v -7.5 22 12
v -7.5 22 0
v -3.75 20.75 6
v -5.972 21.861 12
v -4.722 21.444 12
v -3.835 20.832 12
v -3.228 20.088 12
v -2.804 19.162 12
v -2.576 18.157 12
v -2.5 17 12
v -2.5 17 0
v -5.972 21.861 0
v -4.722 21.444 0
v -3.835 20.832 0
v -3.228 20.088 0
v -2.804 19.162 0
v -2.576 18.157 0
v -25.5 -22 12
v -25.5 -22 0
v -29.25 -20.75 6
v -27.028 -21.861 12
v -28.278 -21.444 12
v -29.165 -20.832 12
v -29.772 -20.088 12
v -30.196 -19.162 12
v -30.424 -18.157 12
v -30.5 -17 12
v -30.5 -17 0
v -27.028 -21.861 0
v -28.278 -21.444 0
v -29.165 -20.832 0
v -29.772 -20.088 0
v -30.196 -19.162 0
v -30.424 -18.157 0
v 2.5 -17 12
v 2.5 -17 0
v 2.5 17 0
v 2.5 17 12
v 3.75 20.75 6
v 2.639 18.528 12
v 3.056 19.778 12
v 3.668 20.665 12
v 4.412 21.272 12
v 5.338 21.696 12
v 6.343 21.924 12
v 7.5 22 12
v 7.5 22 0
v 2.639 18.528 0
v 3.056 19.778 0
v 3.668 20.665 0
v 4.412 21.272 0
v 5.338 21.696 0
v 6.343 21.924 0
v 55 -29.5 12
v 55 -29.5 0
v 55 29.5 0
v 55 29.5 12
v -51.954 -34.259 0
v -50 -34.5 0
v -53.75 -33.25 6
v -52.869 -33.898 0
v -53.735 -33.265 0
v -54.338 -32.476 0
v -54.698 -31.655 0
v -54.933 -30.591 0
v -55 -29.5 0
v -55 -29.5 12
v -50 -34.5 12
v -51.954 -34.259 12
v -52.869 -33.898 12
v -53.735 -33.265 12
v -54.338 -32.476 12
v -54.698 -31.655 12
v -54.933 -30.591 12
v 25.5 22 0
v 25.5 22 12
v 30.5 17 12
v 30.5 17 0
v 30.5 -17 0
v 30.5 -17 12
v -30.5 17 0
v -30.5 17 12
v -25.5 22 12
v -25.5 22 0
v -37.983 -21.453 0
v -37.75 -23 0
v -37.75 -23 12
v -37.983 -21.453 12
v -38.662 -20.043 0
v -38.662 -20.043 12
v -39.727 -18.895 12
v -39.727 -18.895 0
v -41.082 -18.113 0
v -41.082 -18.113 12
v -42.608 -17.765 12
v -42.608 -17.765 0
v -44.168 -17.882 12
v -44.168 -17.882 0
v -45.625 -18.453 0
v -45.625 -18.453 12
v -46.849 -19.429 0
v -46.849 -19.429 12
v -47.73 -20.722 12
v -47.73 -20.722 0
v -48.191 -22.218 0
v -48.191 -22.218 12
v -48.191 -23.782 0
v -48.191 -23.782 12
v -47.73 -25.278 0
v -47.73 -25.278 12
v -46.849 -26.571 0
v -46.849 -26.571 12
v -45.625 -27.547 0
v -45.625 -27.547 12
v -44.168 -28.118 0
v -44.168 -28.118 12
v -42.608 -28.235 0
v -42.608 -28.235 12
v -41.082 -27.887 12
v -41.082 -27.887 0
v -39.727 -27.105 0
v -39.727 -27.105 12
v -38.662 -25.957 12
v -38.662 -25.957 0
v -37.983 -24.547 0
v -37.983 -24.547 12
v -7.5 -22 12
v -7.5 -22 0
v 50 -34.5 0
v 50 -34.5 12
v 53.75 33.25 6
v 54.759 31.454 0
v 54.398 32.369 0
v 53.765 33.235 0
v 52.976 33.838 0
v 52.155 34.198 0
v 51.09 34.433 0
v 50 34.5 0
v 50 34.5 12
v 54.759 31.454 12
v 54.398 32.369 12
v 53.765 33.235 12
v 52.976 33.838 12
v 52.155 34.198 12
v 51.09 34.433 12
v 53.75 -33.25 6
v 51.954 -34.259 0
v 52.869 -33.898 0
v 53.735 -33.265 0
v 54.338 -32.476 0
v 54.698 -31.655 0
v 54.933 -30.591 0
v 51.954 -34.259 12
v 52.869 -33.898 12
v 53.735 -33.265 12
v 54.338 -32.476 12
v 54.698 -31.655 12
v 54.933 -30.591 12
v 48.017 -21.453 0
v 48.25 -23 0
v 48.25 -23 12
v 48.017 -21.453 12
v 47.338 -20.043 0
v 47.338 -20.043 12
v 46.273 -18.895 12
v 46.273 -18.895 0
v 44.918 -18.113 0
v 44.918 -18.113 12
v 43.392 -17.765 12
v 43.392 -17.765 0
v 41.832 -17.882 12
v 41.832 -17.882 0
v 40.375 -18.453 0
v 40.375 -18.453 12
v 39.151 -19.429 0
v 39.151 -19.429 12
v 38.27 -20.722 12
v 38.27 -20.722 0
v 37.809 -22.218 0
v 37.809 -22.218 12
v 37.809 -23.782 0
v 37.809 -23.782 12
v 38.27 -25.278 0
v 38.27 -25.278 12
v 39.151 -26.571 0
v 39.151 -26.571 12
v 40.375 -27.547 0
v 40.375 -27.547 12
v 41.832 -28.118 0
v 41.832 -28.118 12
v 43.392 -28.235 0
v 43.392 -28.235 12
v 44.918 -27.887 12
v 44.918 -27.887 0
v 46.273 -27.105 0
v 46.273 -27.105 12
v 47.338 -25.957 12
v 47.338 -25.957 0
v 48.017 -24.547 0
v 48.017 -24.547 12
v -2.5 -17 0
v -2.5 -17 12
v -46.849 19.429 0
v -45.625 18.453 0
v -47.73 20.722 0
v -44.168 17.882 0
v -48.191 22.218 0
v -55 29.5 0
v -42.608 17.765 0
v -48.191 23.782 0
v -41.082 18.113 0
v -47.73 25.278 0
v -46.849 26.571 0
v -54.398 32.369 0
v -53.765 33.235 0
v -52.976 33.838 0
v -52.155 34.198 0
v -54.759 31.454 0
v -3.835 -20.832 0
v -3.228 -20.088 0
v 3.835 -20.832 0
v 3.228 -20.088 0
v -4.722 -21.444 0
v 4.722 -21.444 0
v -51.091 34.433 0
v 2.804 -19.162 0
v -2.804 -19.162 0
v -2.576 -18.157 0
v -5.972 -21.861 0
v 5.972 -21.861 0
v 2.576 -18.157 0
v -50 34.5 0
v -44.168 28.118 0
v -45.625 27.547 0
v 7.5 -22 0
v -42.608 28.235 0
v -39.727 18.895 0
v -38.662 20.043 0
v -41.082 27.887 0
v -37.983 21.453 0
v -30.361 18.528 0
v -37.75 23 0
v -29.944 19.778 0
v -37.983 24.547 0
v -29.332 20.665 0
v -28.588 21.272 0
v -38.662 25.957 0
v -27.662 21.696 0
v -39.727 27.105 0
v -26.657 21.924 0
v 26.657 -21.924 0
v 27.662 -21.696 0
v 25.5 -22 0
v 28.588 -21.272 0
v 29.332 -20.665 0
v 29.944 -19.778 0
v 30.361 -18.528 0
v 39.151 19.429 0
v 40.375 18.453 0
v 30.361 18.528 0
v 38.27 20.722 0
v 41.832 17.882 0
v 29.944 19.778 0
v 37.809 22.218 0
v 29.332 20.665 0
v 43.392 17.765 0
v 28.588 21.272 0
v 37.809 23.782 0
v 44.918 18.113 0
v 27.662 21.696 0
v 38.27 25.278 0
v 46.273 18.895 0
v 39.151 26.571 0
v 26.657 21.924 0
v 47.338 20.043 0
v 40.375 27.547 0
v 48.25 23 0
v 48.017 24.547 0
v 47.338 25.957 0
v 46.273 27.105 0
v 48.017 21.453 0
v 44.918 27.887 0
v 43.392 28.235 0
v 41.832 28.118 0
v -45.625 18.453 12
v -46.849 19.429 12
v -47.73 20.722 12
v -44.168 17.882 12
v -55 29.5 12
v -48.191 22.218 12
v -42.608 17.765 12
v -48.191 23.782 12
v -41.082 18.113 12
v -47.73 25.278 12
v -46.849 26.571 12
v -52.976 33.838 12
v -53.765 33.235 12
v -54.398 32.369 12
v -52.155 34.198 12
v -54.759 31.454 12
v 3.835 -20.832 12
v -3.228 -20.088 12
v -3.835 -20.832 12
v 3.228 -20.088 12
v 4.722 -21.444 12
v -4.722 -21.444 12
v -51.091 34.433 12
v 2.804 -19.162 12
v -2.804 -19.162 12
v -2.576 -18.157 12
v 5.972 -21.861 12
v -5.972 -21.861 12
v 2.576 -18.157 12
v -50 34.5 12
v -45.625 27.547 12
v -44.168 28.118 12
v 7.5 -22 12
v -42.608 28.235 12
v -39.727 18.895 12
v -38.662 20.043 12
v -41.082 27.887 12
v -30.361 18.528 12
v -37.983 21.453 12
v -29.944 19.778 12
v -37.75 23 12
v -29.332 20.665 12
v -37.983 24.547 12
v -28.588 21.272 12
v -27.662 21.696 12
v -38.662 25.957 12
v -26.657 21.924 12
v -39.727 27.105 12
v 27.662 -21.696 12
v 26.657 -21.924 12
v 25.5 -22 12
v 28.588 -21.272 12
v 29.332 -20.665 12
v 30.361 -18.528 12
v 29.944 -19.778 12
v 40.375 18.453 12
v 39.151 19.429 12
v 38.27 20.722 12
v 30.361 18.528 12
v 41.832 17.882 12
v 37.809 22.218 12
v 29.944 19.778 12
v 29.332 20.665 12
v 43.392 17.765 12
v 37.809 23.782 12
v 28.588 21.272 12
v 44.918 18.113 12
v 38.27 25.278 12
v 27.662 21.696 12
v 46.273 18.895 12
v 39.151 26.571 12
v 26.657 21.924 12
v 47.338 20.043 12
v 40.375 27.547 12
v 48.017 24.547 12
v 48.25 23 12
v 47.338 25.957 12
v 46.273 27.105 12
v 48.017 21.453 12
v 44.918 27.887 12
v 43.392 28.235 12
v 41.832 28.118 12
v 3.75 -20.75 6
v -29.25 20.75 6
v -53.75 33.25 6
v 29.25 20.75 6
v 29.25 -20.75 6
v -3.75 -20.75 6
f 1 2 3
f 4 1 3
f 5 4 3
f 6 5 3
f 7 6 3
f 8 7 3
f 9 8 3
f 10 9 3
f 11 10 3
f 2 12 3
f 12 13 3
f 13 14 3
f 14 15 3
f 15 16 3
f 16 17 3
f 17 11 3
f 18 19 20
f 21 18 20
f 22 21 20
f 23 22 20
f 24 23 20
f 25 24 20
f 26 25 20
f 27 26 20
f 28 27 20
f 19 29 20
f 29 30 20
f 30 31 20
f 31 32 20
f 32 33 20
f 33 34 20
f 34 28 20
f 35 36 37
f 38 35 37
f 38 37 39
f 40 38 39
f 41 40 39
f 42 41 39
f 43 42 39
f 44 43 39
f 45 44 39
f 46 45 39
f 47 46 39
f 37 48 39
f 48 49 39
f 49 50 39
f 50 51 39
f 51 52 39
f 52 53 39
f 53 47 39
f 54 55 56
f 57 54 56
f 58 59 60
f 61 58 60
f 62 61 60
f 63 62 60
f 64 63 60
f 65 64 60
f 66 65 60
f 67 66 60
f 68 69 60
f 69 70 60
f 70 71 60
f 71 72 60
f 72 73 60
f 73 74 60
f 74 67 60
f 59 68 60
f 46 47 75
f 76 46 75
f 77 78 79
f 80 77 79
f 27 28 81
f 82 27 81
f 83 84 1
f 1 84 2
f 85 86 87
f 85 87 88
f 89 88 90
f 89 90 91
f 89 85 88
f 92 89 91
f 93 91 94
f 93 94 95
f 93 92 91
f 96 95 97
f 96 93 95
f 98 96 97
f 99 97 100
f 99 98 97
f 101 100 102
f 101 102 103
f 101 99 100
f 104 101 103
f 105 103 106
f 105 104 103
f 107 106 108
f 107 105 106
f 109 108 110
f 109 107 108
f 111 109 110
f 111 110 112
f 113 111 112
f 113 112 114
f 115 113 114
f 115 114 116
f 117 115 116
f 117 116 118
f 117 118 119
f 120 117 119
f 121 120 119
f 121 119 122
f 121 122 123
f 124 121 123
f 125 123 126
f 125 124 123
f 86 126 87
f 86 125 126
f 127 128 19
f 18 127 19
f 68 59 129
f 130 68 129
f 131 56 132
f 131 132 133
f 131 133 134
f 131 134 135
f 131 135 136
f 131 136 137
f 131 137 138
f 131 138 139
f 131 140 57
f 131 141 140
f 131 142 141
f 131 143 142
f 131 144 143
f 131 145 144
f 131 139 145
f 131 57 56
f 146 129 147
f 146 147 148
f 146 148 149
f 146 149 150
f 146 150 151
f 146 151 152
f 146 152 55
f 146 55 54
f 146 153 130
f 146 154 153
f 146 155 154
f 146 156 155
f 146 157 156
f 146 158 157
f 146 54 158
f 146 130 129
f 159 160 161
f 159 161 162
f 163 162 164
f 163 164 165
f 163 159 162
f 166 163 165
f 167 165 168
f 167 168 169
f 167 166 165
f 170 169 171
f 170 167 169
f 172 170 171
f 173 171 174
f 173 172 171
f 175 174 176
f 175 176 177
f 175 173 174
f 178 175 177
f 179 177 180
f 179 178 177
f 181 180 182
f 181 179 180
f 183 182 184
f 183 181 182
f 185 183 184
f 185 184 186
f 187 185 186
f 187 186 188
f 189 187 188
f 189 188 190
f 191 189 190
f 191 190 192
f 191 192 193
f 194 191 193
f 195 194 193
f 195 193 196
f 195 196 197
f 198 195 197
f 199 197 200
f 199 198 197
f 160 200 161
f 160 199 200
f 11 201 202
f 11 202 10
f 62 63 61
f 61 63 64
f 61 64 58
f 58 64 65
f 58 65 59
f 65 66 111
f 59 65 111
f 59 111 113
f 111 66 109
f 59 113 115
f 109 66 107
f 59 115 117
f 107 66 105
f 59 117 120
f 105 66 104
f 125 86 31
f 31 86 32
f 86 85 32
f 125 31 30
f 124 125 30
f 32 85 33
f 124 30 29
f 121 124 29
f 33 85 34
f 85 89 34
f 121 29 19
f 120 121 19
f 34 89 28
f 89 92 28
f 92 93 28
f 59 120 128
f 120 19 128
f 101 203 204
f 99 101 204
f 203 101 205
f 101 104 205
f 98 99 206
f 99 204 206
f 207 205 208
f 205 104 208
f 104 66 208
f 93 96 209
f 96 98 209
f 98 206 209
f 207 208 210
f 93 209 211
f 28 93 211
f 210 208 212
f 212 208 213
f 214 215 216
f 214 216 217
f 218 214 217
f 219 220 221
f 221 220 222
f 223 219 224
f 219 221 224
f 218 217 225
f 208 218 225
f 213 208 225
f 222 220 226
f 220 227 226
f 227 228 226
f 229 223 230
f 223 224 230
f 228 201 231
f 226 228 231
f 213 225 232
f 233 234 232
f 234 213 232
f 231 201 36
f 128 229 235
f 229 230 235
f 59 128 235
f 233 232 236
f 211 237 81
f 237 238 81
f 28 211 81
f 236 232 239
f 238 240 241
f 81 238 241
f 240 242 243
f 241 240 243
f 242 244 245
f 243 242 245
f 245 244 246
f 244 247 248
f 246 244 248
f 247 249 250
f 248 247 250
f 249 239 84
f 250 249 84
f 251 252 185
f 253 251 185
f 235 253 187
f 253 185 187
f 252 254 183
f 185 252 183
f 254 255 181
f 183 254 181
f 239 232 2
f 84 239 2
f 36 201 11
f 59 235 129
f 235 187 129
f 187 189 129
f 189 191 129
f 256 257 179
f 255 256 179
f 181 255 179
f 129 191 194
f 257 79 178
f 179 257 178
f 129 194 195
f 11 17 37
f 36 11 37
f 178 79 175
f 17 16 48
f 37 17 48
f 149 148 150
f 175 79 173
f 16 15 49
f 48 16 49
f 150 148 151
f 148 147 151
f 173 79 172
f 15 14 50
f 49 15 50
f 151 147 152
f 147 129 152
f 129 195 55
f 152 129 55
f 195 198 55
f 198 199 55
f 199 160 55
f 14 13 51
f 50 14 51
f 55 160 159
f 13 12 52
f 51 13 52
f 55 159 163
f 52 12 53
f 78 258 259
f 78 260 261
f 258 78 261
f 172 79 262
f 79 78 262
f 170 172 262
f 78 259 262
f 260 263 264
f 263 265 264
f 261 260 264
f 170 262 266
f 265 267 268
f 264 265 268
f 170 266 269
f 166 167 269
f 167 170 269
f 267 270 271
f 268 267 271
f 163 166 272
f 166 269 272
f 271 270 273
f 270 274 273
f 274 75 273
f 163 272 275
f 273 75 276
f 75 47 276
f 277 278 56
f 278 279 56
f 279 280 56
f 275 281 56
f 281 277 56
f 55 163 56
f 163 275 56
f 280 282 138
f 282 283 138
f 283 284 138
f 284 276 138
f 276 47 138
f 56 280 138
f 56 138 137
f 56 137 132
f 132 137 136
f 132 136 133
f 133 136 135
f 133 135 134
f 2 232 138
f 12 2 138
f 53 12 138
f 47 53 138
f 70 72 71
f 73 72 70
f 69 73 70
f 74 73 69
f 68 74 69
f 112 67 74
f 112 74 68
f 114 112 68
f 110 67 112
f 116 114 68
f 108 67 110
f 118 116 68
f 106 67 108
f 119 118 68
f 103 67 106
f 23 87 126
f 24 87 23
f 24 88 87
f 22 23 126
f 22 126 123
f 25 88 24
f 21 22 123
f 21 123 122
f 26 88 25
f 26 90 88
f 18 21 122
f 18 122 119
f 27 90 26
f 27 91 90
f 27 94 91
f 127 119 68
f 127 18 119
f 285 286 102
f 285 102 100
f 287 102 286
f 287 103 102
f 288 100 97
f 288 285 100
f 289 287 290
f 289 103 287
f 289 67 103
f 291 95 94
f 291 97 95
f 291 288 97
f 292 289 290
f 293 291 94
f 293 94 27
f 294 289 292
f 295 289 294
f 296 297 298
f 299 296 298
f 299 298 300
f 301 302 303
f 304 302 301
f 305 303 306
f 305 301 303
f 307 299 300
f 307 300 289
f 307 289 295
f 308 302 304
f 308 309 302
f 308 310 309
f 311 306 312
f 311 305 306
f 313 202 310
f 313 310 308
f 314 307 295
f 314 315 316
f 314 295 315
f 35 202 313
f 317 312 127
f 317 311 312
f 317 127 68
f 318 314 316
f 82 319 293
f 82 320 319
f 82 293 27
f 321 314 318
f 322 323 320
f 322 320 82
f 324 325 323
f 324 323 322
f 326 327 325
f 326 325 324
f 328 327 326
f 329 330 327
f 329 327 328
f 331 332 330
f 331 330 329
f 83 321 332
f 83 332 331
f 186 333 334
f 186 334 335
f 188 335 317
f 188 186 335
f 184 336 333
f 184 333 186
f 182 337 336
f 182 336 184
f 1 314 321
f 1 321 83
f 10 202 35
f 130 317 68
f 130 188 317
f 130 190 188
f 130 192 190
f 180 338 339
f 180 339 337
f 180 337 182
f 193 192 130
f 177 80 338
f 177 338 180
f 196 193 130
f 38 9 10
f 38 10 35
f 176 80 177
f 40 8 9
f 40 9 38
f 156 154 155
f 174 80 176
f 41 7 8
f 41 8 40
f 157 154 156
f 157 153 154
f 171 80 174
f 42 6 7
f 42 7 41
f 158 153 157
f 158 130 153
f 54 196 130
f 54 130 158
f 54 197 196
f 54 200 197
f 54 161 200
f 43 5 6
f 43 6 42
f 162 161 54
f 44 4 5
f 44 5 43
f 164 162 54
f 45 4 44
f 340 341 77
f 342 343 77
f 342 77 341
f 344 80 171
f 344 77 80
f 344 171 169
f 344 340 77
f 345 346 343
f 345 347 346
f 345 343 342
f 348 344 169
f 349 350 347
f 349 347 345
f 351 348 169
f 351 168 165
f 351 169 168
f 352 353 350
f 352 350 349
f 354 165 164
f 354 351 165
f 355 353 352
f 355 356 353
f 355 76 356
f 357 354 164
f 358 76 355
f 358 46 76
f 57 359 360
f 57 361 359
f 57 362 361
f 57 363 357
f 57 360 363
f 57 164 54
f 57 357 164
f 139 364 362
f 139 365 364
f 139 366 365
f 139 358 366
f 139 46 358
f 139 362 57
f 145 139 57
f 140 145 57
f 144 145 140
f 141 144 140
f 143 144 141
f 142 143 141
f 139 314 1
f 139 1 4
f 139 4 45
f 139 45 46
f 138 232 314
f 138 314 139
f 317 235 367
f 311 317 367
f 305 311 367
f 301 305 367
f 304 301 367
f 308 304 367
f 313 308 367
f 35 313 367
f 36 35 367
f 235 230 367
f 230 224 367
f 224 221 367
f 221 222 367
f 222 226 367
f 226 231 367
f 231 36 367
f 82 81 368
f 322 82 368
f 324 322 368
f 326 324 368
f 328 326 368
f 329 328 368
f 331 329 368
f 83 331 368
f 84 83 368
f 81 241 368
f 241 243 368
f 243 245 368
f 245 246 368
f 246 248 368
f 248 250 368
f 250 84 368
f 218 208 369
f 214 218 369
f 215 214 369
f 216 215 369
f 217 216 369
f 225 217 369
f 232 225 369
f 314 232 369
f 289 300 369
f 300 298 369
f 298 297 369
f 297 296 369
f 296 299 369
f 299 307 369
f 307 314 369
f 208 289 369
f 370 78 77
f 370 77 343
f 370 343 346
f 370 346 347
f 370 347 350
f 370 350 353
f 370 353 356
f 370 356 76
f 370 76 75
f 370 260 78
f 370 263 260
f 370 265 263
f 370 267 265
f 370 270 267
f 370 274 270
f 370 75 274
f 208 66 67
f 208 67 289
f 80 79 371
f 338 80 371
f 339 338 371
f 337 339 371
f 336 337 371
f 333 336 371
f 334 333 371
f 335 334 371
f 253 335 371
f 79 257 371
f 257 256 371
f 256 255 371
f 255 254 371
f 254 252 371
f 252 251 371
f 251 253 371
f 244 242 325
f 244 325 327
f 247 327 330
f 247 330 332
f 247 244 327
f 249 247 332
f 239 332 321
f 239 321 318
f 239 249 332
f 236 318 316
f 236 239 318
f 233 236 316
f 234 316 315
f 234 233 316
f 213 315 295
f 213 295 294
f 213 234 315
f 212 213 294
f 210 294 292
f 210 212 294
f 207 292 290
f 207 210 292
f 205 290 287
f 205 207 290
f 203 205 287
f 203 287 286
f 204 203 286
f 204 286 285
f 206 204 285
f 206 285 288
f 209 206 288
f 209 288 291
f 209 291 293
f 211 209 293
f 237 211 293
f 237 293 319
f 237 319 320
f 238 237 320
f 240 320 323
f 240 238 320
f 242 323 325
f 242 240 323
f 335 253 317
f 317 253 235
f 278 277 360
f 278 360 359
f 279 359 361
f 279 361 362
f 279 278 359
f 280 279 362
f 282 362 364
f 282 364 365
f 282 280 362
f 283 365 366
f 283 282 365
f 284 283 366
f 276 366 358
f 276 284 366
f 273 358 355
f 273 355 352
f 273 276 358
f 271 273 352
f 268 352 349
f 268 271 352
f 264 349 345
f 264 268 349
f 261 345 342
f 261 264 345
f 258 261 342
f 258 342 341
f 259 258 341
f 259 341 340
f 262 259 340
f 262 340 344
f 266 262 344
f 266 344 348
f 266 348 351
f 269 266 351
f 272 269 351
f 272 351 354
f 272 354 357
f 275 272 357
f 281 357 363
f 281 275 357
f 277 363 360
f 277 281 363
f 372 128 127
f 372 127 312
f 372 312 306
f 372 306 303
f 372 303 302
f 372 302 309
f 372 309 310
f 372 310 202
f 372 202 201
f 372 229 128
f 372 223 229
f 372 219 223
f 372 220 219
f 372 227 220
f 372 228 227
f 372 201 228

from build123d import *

# Parameters (mm, degrees)
F0_W        = 110
F0_H        = 69
F0_R        = 5.25
F0_W_2      = 5
F0_H_2      = 44
F1_DEPTH    = 12
F2_T1_DEPTH = 12
F2_T3_DEPTH = 37


# Not quite as in the source:
# - a fillet or chamfer that OpenCascade refuses, or shapes differently, is made with other operations: its cross-section is extruded or revolved along the edge and cut away or added


with BuildPart() as f1:
    # F0 (on Top) → F1 (new body)
    with BuildSketch(Plane.XY):
        Rectangle(F0_W, F0_H)
        with Locations((-43, -23)):
            Circle(F0_R, mode=Mode.SUBTRACT)
        with Locations((43, -23)):
            Circle(F0_R, mode=Mode.SUBTRACT)
        with Locations((-43, 23)):
            Circle(F0_R, mode=Mode.SUBTRACT)
        Polygon((30.5, 22), (30.5, -22), (2.5, -22), (-2.5, -22), (-30.5, -22), (-30.5, 22), (-2.5, 22), (2.5, 22), align=None, mode=Mode.SUBTRACT)
        with Locations((43, 23)):
            Circle(F0_R, mode=Mode.SUBTRACT)
        Rectangle(F0_W_2, F0_H_2)
    extrude(amount=F1_DEPTH)

    # F2: fillet of radius 5 on 12 edges, made by hand

    # F2_s2 → F2_t1 (join)
    with BuildSketch(Plane.XY):
        with BuildLine():
            add(Edge.make_bspline(
                [(-30.5, 17), (-30.5, 22), (-25.5, 22)],
                knots=[0, 0, 0, 1, 1, 1], degree=2, weights=[1, 1, 1]))
            Line((-25.5, 22), (-30.5, 22))
            Line((-30.5, 22), (-30.5, 17))
        make_face()
        with BuildLine():
            add(Edge.make_bspline(
                [(2.5, 17), (2.5, 22), (7.5, 22)],
                knots=[0, 0, 0, 1, 1, 1], degree=2, weights=[1, 1, 1]))
            Line((7.5, 22), (2.5, 22))
            Line((2.5, 22), (2.5, 17))
        make_face()
        with BuildLine():
            add(Edge.make_bspline(
                [(30.5, -17), (30.5, -22), (25.5, -22)],
                knots=[0, 0, 0, 1, 1, 1], degree=2, weights=[1, 1, 1]))
            Line((25.5, -22), (30.5, -22))
            Line((30.5, -22), (30.5, -17))
        make_face()
        with BuildLine():
            add(Edge.make_bspline(
                [(-7.5, -22), (-2.5, -22), (-2.5, -17)],
                knots=[0, 0, 0, 1, 1, 1], degree=2, weights=[1, 1, 1]))
            Line((-2.5, -17), (-2.5, -22))
            Line((-2.5, -22), (-7.5, -22))
        make_face()
        with BuildLine():
            add(Edge.make_bspline(
                [(30.5, 17), (30.5, 22), (25.5, 22)],
                knots=[0, 0, 0, 1, 1, 1], degree=2, weights=[1, 1, 1]))
            Line((25.5, 22), (30.5, 22))
            Line((30.5, 22), (30.5, 17))
        make_face()
        with BuildLine():
            add(Edge.make_bspline(
                [(-7.5, 22), (-2.5, 22), (-2.5, 17)],
                knots=[0, 0, 0, 1, 1, 1], degree=2, weights=[1, 1, 1]))
            Line((-2.5, 17), (-2.5, 22))
            Line((-2.5, 22), (-7.5, 22))
        make_face()
        with BuildLine():
            add(Edge.make_bspline(
                [(-25.5, -22), (-30.5, -22), (-30.5, -17)],
                knots=[0, 0, 0, 1, 1, 1], degree=2, weights=[1, 1, 1]))
            Line((-30.5, -17), (-30.5, -22))
            Line((-30.5, -22), (-25.5, -22))
        make_face()
        with BuildLine():
            add(Edge.make_bspline(
                [(7.5, -22), (2.5, -22), (2.5, -17)],
                knots=[0, 0, 0, 1, 1, 1], degree=2, weights=[1, 1, 1]))
            Line((2.5, -17), (2.5, -22))
            Line((2.5, -22), (7.5, -22))
        make_face()
    extrude(amount=F2_T1_DEPTH)

    # F2_s4 → F2_t3 (cut)
    with BuildSketch(Plane.XY.offset(-12.5)):
        with BuildLine():
            add(Edge.make_bspline(
                [(55, -29.5), (55, -34.5), (50, -34.5)],
                knots=[0, 0, 0, 1, 1, 1], degree=2, weights=[1, 1, 1]))
            Line((50, -34.5), (55, -34.5))
            Line((55, -34.5), (55, -29.5))
        make_face()
        with BuildLine():
            add(Edge.make_bspline(
                [(50, 34.5), (55, 34.5), (55, 29.5)],
                knots=[0, 0, 0, 1, 1, 1], degree=2, weights=[1, 1, 1]))
            Line((55, 29.5), (55, 34.5))
            Line((55, 34.5), (50, 34.5))
        make_face()
        with BuildLine():
            add(Edge.make_bspline(
                [(-55, -29.5), (-55, -34.5), (-50, -34.5)],
                knots=[0, 0, 0, 1, 1, 1], degree=2, weights=[1, 1, 1]))
            Line((-50, -34.5), (-55, -34.5))
            Line((-55, -34.5), (-55, -29.5))
        make_face()
        with BuildLine():
            add(Edge.make_bspline(
                [(-50, 34.5), (-55, 34.5), (-55, 29.5)],
                knots=[0, 0, 0, 1, 1, 1], degree=2, weights=[1, 1, 1]))
            Line((-55, 29.5), (-55, 34.5))
            Line((-55, 34.5), (-50, 34.5))
        make_face()
    extrude(amount=F2_T3_DEPTH, mode=Mode.SUBTRACT)


solid = f1.part
